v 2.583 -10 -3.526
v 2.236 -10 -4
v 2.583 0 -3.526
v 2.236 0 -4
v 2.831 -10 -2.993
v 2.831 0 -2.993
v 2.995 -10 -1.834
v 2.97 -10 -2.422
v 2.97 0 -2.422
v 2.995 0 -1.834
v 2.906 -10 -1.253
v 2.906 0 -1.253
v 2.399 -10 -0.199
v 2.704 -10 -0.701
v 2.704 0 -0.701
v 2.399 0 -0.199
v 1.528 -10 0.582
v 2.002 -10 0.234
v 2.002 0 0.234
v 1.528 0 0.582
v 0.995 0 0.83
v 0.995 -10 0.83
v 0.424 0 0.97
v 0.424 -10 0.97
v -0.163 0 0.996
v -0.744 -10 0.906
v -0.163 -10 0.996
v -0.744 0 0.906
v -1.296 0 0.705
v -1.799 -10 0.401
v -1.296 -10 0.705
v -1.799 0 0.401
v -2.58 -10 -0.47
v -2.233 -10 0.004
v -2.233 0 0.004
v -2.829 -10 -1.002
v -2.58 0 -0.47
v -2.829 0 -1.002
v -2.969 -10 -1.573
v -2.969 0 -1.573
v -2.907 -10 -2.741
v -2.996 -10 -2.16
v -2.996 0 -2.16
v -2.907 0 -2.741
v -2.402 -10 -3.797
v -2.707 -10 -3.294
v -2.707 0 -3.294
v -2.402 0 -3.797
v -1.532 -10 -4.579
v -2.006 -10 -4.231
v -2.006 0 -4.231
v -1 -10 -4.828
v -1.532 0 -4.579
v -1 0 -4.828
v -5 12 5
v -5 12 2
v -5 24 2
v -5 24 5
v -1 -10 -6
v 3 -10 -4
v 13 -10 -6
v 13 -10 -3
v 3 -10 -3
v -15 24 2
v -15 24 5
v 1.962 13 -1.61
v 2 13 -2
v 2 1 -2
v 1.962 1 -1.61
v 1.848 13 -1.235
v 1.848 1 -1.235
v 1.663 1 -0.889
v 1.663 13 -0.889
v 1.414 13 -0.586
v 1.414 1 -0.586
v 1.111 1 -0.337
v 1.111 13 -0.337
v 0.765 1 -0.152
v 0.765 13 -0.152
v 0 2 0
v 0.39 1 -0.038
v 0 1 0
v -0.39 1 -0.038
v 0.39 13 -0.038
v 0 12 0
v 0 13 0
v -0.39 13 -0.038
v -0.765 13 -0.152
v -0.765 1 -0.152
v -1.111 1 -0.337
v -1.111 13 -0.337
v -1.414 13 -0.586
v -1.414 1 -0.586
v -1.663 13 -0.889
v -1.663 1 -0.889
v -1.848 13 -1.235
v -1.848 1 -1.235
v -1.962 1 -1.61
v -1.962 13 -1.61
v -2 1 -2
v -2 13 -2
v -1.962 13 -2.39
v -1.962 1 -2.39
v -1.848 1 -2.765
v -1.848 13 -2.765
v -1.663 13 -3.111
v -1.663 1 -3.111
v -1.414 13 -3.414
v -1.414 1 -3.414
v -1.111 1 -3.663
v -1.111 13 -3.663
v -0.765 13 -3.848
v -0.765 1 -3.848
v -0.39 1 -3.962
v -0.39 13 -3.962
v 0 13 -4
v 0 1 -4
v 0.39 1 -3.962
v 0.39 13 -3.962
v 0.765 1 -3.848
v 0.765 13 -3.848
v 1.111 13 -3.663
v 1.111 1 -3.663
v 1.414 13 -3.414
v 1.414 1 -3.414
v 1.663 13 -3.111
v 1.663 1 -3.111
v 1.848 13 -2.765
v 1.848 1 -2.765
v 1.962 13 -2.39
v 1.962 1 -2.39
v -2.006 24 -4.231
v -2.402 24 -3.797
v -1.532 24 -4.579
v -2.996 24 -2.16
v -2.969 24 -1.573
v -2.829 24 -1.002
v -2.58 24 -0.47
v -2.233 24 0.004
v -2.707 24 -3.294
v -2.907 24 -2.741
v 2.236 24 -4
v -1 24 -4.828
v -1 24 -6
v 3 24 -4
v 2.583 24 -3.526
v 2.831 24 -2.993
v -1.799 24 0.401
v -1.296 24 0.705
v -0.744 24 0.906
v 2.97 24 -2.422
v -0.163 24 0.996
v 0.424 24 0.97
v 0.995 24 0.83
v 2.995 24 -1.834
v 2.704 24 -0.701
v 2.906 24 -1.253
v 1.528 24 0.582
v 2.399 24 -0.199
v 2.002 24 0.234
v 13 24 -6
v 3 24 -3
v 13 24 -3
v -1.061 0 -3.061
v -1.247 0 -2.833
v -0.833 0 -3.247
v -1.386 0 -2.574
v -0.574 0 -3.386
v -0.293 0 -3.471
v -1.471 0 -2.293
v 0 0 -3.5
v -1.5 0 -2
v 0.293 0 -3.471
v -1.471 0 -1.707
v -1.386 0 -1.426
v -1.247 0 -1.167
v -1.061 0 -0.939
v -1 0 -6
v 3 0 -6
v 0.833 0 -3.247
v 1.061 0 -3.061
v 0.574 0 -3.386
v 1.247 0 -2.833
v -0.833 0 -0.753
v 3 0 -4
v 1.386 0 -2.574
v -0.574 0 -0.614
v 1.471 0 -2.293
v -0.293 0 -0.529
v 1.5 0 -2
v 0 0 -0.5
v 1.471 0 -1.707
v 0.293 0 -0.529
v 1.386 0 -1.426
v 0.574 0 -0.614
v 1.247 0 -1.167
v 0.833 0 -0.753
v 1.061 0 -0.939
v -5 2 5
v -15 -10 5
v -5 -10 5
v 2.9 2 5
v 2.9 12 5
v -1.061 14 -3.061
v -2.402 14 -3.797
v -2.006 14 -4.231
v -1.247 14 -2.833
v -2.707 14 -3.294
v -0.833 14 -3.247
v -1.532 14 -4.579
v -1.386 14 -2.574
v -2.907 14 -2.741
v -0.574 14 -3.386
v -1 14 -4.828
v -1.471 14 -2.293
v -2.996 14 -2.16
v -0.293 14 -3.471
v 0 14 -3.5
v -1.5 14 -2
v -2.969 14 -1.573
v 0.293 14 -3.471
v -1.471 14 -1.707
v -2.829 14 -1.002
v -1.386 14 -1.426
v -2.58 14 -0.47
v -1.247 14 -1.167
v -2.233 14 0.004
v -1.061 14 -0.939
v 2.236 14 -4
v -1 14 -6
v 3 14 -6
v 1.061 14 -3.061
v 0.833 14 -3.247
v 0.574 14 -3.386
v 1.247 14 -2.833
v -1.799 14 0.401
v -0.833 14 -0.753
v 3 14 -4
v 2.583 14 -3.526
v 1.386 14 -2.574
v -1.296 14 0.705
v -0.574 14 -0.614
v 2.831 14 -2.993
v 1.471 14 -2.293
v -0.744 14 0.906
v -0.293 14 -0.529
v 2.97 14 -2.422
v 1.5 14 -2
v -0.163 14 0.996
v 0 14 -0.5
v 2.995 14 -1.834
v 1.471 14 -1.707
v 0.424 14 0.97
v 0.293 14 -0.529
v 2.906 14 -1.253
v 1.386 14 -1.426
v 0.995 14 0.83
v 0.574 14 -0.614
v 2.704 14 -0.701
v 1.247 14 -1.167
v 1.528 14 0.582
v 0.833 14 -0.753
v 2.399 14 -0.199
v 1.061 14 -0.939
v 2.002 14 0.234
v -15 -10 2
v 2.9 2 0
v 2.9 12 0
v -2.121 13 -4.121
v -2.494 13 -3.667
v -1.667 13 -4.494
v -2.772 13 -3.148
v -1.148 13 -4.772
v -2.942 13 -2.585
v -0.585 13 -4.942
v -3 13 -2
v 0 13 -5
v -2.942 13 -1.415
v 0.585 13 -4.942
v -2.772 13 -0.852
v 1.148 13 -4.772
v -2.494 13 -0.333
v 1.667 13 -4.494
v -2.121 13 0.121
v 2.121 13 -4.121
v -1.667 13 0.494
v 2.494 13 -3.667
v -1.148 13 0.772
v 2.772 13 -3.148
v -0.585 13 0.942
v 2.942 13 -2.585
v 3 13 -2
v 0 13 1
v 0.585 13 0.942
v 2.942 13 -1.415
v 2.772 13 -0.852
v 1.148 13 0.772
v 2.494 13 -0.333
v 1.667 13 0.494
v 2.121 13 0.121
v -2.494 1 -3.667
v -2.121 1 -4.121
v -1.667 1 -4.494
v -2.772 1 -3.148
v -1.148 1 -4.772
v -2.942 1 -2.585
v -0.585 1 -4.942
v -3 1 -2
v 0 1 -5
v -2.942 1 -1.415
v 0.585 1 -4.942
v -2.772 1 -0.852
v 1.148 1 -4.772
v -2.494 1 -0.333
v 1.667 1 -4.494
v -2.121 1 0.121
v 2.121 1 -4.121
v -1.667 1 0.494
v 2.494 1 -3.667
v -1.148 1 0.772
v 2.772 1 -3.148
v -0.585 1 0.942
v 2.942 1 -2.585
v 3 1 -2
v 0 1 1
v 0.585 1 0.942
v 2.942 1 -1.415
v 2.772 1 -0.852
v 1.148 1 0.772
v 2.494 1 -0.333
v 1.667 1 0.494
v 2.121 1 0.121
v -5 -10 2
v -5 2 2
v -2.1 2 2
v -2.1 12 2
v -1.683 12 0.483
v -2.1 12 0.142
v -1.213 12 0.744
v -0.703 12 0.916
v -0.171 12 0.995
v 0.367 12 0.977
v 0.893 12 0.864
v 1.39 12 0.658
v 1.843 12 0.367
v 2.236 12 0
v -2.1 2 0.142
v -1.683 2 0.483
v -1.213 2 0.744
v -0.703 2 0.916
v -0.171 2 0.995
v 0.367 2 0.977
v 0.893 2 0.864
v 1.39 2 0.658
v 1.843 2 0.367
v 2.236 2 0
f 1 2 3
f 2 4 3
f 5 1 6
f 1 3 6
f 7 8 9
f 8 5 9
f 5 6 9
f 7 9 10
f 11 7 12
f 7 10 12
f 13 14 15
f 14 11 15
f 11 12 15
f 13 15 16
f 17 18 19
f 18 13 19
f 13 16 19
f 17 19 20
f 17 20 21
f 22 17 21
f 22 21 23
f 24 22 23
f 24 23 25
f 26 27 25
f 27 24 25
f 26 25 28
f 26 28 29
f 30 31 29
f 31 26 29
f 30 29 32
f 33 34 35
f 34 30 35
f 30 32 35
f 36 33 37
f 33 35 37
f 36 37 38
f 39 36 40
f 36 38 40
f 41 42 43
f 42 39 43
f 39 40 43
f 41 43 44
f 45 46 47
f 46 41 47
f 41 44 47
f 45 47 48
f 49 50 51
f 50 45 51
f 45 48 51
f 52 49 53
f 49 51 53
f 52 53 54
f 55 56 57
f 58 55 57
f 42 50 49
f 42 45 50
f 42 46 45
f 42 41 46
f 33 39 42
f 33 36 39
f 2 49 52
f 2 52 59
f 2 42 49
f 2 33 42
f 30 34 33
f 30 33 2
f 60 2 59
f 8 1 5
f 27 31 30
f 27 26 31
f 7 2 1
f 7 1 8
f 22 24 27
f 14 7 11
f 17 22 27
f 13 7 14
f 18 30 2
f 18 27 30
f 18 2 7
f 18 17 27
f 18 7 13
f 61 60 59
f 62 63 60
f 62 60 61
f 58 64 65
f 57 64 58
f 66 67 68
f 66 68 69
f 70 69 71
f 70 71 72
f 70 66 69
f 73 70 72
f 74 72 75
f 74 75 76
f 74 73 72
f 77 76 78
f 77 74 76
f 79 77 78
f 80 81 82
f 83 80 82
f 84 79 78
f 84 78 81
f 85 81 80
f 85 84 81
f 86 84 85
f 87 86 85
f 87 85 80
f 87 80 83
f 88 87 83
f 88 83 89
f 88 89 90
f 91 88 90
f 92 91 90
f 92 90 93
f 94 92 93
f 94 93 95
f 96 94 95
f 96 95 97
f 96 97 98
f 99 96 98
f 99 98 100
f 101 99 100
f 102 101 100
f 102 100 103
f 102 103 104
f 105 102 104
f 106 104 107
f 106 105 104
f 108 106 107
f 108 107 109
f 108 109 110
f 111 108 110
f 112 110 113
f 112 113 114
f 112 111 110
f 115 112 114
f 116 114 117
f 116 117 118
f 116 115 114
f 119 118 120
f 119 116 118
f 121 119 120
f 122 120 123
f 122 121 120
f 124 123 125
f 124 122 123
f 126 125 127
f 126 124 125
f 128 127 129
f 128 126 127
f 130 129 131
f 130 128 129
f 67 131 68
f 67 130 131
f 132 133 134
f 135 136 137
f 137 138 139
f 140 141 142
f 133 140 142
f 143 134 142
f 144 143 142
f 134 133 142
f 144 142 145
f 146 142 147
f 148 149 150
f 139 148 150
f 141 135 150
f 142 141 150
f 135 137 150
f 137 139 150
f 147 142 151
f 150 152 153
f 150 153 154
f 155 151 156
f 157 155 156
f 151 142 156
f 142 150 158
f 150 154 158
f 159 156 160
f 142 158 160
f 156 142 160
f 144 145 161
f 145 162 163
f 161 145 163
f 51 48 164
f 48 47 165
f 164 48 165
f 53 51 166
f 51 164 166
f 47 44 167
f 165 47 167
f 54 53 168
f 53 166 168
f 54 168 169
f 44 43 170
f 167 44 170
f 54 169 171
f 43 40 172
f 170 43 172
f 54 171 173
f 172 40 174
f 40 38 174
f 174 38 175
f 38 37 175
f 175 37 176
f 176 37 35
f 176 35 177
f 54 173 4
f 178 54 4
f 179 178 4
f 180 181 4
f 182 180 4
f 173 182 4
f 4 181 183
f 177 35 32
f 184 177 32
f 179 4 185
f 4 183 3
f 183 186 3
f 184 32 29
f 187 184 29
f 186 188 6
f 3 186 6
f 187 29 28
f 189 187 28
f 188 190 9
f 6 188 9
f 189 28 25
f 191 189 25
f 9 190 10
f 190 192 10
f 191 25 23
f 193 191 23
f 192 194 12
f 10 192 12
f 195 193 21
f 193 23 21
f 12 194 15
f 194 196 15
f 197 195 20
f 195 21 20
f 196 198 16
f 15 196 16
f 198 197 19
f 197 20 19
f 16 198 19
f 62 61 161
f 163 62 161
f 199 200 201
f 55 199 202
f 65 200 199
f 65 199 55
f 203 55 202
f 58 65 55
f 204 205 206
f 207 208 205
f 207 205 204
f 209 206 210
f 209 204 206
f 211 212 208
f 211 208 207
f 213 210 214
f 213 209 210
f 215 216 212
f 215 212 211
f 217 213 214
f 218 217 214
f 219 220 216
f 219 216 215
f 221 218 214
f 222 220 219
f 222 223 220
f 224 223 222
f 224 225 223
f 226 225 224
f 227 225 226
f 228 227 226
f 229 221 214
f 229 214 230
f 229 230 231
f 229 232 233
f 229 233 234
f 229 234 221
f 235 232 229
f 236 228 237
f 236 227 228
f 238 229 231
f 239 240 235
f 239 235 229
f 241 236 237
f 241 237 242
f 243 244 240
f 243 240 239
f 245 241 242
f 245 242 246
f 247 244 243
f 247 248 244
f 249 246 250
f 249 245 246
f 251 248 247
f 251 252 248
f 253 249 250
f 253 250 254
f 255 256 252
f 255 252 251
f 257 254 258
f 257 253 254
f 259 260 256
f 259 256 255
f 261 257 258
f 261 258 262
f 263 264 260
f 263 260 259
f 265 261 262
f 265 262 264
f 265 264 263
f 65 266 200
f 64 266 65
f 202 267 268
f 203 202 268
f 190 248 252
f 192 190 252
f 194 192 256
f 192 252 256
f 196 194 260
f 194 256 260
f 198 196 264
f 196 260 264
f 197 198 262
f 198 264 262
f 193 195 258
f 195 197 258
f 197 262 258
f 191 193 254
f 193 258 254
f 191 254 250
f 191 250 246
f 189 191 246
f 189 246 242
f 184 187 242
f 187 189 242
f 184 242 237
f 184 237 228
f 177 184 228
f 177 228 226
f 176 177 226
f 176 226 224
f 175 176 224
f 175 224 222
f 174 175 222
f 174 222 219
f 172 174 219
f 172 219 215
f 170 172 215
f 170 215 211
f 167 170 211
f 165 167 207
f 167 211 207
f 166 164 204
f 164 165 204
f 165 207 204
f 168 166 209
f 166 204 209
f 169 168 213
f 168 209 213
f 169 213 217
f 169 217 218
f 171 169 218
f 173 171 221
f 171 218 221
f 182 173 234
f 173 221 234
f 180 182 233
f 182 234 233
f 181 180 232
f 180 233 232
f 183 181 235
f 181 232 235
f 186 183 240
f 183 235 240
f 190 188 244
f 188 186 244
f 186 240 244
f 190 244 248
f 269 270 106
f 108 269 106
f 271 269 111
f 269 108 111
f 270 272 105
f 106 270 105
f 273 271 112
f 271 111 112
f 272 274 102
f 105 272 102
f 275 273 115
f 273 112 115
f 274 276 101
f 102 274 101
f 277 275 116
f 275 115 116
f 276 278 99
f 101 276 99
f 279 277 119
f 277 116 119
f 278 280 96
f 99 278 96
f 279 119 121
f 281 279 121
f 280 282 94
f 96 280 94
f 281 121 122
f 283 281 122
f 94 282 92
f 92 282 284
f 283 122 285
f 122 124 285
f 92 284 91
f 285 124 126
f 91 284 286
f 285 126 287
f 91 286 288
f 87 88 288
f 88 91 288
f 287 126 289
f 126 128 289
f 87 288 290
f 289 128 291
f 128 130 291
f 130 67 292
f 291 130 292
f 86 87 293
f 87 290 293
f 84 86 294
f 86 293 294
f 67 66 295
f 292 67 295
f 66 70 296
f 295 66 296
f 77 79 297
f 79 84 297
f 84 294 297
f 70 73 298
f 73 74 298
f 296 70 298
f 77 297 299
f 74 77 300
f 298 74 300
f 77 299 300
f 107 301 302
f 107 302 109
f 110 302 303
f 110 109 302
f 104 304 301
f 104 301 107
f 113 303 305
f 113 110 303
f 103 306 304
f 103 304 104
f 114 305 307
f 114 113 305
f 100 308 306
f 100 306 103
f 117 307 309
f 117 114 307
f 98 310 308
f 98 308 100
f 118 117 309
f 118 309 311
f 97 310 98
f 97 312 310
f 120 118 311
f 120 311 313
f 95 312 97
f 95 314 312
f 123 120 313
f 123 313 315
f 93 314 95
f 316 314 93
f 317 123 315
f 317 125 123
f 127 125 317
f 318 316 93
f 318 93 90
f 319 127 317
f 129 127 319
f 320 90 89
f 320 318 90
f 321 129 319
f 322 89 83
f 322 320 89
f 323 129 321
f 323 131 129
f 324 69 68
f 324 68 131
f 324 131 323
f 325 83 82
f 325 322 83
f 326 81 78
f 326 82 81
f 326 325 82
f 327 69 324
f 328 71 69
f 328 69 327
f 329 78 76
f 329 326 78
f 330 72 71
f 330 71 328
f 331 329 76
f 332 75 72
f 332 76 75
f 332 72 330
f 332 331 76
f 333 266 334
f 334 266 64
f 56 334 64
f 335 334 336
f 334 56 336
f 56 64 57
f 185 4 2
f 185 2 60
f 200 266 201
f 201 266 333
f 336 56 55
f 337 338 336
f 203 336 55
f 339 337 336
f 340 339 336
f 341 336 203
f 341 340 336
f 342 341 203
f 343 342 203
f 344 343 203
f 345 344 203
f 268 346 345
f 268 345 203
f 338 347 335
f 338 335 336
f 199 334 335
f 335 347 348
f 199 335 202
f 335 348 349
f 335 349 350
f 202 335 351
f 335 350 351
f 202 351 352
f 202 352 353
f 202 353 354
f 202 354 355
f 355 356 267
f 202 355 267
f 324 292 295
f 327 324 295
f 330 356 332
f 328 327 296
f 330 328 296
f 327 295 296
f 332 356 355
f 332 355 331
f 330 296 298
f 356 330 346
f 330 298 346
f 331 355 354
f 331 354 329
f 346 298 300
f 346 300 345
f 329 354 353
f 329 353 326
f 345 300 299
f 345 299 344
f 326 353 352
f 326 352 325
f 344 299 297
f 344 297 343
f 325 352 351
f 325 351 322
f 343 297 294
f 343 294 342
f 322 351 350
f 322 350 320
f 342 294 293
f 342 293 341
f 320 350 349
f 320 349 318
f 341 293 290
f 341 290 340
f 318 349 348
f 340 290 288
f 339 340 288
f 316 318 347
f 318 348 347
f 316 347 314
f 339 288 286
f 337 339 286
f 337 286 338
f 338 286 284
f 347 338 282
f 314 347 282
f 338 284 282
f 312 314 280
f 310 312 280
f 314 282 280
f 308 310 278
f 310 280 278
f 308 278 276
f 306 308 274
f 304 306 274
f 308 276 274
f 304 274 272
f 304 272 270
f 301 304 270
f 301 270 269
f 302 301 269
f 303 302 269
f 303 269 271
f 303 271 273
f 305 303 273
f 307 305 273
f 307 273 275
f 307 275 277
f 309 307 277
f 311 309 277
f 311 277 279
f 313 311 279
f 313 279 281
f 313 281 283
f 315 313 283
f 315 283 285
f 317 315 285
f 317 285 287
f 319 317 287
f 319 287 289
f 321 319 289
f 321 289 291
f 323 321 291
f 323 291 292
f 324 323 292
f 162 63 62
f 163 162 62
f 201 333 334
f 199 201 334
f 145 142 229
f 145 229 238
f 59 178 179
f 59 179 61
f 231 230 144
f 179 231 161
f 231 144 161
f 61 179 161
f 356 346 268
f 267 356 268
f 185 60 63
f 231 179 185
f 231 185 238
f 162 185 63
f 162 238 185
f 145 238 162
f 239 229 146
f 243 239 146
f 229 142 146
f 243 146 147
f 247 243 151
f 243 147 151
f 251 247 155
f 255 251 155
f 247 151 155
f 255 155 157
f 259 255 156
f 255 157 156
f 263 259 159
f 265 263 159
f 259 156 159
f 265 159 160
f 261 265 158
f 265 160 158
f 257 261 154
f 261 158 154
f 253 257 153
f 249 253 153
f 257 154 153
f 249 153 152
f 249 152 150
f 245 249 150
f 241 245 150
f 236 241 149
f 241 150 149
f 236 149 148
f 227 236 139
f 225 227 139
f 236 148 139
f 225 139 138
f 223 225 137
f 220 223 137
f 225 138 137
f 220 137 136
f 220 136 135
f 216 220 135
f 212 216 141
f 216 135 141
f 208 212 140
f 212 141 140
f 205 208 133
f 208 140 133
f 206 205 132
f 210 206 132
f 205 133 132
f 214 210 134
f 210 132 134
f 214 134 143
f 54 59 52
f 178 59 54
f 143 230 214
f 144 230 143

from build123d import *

# Parameters (mm, degrees)
BOX003_W               = 4
BOX003_H               = 10
BOX003_DEPTH           = 2
BOX001_W               = 10
BOX001_H               = 34
BOX001_DEPTH           = 3
CYLINDER002_R          = 3
CYLINDER002_DEPTH      = 10
CYLINDER002_ROLL_ANGLE = 90
CYLINDER004_R          = 1.5
CYLINDER004_DEPTH      = 30
CYLINDER004_ROLL_ANGLE = 90
CYLINDER_R             = 3
CYLINDER_DEPTH         = 10
CYLINDER_ROLL_ANGLE    = 90
BOX004_W               = 4
BOX004_H               = 10
BOX004_DEPTH           = 2
BOX002_W               = 8
BOX002_H               = 10
BOX002_DEPTH           = 3
BOX_W                  = 10
BOX_H                  = 34
BOX_DEPTH              = 3
CYLINDER003_R          = 2
CYLINDER003_DEPTH      = 12
CYLINDER003_ROLL_ANGLE = 90
CYLINDER001_R          = 3
CYLINDER001_DEPTH      = 12
CYLINDER001_ROLL_ANGLE = 90
BOX005_W               = 5
BOX005_H               = 10
BOX005_DEPTH           = 3


with BuildPart() as cube003:
    # Box003 → Box003 (new body)
    with BuildSketch(Plane(origin=(-1, -10, -6), x_dir=(1, 0, 0), z_dir=(0, 0, 1))):
        with Locations((2, 5)):
            Rectangle(BOX003_W, BOX003_H)
    extrude(amount=BOX003_DEPTH)


with BuildPart() as cube001:
    # Box001 → Box001 (new body)
    with BuildSketch(Plane(origin=(3, -10, -6), x_dir=(1, 0, 0), z_dir=(0, 0, 1))):
        with Locations((5, 17)):
            Rectangle(BOX001_W, BOX001_H)
    extrude(amount=BOX001_DEPTH)


with BuildPart() as cylinder002:
    # Cylinder002 → Cylinder002 (new body)
    with BuildSketch(Plane.XY):
        Circle(CYLINDER002_R)
    extrude(amount=CYLINDER002_DEPTH)


with BuildPart() as cylinder002_1:
    # Cylinder002 roll: moved
    add(cylinder002.part.rotate(Axis((0, 0, 0), (1, 0, 0)), CYLINDER002_ROLL_ANGLE))


with BuildPart() as cylinder002_2:
    # Cylinder002 placement: moved
    add(cylinder002_1.part.moved(Location((0, 24, -2))))


with BuildPart() as cylinder004:
    # Cylinder004 → Cylinder004 (new body)
    with BuildSketch(Plane.XY):
        Circle(CYLINDER004_R)
    extrude(amount=CYLINDER004_DEPTH)


with BuildPart() as cylinder004_1:
    # Cylinder004 roll: moved
    add(cylinder004.part.rotate(Axis((0, 0, 0), (1, 0, 0)), CYLINDER004_ROLL_ANGLE))


with BuildPart() as cylinder004_2:
    # Cylinder004 placement: moved
    add(cylinder004_1.part.moved(Location((0, 22, -2))))


with BuildPart() as fusion:
    # Cylinder → Cylinder (new body)
    with BuildSketch(Plane.XY):
        Circle(CYLINDER_R)
    extrude(amount=CYLINDER_DEPTH)


with BuildPart() as fusion_1:
    # Cylinder roll: moved
    add(fusion.part.rotate(Axis((0, 0, 0), (1, 0, 0)), CYLINDER_ROLL_ANGLE))


with BuildPart() as fusion_2:
    # Cylinder placement: moved
    add(fusion_1.part.moved(Location((0, 0, -2))))

    # Fusion: union Cylinder002, Cylinder004
    add(cylinder002_2.part)
    add(cylinder004_2.part)


with BuildPart() as fusion003:
    # Box004 → Box004 (new body)
    with BuildSketch(Plane(origin=(-1, 14, -6), x_dir=(1, 0, 0), z_dir=(0, 0, 1))):
        with Locations((2, 5)):
            Rectangle(BOX004_W, BOX004_H)
    extrude(amount=BOX004_DEPTH)

    # Fusion003: union Cube003, Cube001, Fusion
    add(cube003.part)
    add(cube001.part)
    add(fusion_2.part)


with BuildPart() as cube002:
    # Box002 → Box002 (new body)
    with BuildSketch(Plane(origin=(-5.1, 2, 2), x_dir=(1, 0, 0), z_dir=(0, 0, 1))):
        with Locations((4, 5)):
            Rectangle(BOX002_W, BOX002_H)
    extrude(amount=BOX002_DEPTH)


with BuildPart() as fusion001:
    # Box → Box (new body)
    with BuildSketch(Plane(origin=(-15, -10, 2), x_dir=(1, 0, 0), z_dir=(0, 0, 1))):
        with Locations((5, 17)):
            Rectangle(BOX_W, BOX_H)
    extrude(amount=BOX_DEPTH)

    # Fusion001: union Cube002
    add(cube002.part)


with BuildPart() as cylinder003:
    # Cylinder003 → Cylinder003 (new body)
    with BuildSketch(Plane.XY):
        Circle(CYLINDER003_R)
    extrude(amount=CYLINDER003_DEPTH)


with BuildPart() as cylinder003_1:
    # Cylinder003 roll: moved
    add(cylinder003.part.rotate(Axis((0, 0, 0), (1, 0, 0)), CYLINDER003_ROLL_ANGLE))


with BuildPart() as cylinder003_2:
    # Cylinder003 placement: moved
    add(cylinder003_1.part.moved(Location((0, 13, -2))))


with BuildPart() as fusion002:
    # Cylinder001 → Cylinder001 (new body)
    with BuildSketch(Plane.XY):
        Circle(CYLINDER001_R)
    extrude(amount=CYLINDER001_DEPTH)


with BuildPart() as fusion002_1:
    # Cylinder001 roll: moved
    add(fusion002.part.rotate(Axis((0, 0, 0), (1, 0, 0)), CYLINDER001_ROLL_ANGLE))


with BuildPart() as fusion002_2:
    # Cylinder001 placement: moved
    add(fusion002_1.part.moved(Location((0, 13, -2))))

    # Cut: cut Cylinder003
    add(cylinder003_2.part, mode=Mode.SUBTRACT)

    # Fusion002: union Fusion001
    add(fusion001.part)


with BuildPart() as fusion004:
    # Box005 → Box005 (new body)
    with BuildSketch(Plane(origin=(-2.1, 2, 0), x_dir=(1, 0, 0), z_dir=(0, 0, 1))):
        with Locations((2.5, 5)):
            Rectangle(BOX005_W, BOX005_H)
    extrude(amount=BOX005_DEPTH)

    # Fusion004: union Fusion002
    add(fusion002_2.part)


solid = Compound([fusion003.part, fusion004.part])
